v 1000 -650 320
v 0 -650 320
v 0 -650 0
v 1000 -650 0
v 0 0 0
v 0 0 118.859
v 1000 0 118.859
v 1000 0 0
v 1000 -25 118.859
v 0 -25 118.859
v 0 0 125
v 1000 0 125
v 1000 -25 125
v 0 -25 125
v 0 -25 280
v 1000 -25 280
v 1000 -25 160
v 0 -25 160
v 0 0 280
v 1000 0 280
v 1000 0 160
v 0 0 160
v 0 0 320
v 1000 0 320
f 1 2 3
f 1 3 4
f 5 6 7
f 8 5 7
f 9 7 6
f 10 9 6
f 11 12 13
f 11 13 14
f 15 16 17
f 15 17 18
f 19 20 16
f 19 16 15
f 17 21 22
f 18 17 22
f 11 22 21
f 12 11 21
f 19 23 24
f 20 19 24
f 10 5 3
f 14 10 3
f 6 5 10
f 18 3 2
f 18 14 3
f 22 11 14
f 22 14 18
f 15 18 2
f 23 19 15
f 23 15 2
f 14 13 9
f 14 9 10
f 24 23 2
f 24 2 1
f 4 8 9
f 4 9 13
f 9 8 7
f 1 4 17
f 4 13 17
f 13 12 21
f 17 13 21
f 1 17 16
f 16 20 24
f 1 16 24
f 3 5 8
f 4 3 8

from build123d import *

# Parameters (mm, degrees)
F0_W     = 1000
F0_H     = 320
F1_DEPTH = 650
F2_W     = 1000
F2_H     = 120
F2_H_2   = 125
F3_DEPTH = 28
F4_DEPTH = 25
F5_W     = 1000
F5_H     = 6.141096
F6_DEPTH = 25


with BuildPart() as f1:
    # F0 (on Front) → F1 (new body)
    with BuildSketch(Plane.XZ):
        with Locations((500, 160)):
            Rectangle(F0_W, F0_H)
    extrude(amount=F1_DEPTH)

    # F2 (on face) → F3 (join)
    with BuildSketch(Plane(origin=(0, 0, 0), x_dir=(-1, 0, 0), z_dir=(0, 1, 0))):
        with Locations((-500, 220)):
            Rectangle(F2_W, F2_H)
        with Locations((-500, 62.5)):
            Rectangle(F2_W, F2_H_2)
    extrude(amount=-F3_DEPTH)

    # F2 (on face) → F4 (cut)
    with BuildSketch(Plane(origin=(0, 0, 0), x_dir=(-1, 0, 0), z_dir=(0, 1, 0))):
        with Locations((-500, 220)):
            Rectangle(F2_W, F2_H)
    extrude(amount=-F4_DEPTH, mode=Mode.SUBTRACT)

    # F5 (on face) → F6 (cut)
    with BuildSketch(Plane(origin=(0, 0, 0), x_dir=(-1, 0, 0), z_dir=(0, 1, 0))):
        with Locations((-500, 121.929452)):
            Rectangle(F5_W, F5_H)
    extrude(amount=-F6_DEPTH, mode=Mode.SUBTRACT)


solid = f1.part
